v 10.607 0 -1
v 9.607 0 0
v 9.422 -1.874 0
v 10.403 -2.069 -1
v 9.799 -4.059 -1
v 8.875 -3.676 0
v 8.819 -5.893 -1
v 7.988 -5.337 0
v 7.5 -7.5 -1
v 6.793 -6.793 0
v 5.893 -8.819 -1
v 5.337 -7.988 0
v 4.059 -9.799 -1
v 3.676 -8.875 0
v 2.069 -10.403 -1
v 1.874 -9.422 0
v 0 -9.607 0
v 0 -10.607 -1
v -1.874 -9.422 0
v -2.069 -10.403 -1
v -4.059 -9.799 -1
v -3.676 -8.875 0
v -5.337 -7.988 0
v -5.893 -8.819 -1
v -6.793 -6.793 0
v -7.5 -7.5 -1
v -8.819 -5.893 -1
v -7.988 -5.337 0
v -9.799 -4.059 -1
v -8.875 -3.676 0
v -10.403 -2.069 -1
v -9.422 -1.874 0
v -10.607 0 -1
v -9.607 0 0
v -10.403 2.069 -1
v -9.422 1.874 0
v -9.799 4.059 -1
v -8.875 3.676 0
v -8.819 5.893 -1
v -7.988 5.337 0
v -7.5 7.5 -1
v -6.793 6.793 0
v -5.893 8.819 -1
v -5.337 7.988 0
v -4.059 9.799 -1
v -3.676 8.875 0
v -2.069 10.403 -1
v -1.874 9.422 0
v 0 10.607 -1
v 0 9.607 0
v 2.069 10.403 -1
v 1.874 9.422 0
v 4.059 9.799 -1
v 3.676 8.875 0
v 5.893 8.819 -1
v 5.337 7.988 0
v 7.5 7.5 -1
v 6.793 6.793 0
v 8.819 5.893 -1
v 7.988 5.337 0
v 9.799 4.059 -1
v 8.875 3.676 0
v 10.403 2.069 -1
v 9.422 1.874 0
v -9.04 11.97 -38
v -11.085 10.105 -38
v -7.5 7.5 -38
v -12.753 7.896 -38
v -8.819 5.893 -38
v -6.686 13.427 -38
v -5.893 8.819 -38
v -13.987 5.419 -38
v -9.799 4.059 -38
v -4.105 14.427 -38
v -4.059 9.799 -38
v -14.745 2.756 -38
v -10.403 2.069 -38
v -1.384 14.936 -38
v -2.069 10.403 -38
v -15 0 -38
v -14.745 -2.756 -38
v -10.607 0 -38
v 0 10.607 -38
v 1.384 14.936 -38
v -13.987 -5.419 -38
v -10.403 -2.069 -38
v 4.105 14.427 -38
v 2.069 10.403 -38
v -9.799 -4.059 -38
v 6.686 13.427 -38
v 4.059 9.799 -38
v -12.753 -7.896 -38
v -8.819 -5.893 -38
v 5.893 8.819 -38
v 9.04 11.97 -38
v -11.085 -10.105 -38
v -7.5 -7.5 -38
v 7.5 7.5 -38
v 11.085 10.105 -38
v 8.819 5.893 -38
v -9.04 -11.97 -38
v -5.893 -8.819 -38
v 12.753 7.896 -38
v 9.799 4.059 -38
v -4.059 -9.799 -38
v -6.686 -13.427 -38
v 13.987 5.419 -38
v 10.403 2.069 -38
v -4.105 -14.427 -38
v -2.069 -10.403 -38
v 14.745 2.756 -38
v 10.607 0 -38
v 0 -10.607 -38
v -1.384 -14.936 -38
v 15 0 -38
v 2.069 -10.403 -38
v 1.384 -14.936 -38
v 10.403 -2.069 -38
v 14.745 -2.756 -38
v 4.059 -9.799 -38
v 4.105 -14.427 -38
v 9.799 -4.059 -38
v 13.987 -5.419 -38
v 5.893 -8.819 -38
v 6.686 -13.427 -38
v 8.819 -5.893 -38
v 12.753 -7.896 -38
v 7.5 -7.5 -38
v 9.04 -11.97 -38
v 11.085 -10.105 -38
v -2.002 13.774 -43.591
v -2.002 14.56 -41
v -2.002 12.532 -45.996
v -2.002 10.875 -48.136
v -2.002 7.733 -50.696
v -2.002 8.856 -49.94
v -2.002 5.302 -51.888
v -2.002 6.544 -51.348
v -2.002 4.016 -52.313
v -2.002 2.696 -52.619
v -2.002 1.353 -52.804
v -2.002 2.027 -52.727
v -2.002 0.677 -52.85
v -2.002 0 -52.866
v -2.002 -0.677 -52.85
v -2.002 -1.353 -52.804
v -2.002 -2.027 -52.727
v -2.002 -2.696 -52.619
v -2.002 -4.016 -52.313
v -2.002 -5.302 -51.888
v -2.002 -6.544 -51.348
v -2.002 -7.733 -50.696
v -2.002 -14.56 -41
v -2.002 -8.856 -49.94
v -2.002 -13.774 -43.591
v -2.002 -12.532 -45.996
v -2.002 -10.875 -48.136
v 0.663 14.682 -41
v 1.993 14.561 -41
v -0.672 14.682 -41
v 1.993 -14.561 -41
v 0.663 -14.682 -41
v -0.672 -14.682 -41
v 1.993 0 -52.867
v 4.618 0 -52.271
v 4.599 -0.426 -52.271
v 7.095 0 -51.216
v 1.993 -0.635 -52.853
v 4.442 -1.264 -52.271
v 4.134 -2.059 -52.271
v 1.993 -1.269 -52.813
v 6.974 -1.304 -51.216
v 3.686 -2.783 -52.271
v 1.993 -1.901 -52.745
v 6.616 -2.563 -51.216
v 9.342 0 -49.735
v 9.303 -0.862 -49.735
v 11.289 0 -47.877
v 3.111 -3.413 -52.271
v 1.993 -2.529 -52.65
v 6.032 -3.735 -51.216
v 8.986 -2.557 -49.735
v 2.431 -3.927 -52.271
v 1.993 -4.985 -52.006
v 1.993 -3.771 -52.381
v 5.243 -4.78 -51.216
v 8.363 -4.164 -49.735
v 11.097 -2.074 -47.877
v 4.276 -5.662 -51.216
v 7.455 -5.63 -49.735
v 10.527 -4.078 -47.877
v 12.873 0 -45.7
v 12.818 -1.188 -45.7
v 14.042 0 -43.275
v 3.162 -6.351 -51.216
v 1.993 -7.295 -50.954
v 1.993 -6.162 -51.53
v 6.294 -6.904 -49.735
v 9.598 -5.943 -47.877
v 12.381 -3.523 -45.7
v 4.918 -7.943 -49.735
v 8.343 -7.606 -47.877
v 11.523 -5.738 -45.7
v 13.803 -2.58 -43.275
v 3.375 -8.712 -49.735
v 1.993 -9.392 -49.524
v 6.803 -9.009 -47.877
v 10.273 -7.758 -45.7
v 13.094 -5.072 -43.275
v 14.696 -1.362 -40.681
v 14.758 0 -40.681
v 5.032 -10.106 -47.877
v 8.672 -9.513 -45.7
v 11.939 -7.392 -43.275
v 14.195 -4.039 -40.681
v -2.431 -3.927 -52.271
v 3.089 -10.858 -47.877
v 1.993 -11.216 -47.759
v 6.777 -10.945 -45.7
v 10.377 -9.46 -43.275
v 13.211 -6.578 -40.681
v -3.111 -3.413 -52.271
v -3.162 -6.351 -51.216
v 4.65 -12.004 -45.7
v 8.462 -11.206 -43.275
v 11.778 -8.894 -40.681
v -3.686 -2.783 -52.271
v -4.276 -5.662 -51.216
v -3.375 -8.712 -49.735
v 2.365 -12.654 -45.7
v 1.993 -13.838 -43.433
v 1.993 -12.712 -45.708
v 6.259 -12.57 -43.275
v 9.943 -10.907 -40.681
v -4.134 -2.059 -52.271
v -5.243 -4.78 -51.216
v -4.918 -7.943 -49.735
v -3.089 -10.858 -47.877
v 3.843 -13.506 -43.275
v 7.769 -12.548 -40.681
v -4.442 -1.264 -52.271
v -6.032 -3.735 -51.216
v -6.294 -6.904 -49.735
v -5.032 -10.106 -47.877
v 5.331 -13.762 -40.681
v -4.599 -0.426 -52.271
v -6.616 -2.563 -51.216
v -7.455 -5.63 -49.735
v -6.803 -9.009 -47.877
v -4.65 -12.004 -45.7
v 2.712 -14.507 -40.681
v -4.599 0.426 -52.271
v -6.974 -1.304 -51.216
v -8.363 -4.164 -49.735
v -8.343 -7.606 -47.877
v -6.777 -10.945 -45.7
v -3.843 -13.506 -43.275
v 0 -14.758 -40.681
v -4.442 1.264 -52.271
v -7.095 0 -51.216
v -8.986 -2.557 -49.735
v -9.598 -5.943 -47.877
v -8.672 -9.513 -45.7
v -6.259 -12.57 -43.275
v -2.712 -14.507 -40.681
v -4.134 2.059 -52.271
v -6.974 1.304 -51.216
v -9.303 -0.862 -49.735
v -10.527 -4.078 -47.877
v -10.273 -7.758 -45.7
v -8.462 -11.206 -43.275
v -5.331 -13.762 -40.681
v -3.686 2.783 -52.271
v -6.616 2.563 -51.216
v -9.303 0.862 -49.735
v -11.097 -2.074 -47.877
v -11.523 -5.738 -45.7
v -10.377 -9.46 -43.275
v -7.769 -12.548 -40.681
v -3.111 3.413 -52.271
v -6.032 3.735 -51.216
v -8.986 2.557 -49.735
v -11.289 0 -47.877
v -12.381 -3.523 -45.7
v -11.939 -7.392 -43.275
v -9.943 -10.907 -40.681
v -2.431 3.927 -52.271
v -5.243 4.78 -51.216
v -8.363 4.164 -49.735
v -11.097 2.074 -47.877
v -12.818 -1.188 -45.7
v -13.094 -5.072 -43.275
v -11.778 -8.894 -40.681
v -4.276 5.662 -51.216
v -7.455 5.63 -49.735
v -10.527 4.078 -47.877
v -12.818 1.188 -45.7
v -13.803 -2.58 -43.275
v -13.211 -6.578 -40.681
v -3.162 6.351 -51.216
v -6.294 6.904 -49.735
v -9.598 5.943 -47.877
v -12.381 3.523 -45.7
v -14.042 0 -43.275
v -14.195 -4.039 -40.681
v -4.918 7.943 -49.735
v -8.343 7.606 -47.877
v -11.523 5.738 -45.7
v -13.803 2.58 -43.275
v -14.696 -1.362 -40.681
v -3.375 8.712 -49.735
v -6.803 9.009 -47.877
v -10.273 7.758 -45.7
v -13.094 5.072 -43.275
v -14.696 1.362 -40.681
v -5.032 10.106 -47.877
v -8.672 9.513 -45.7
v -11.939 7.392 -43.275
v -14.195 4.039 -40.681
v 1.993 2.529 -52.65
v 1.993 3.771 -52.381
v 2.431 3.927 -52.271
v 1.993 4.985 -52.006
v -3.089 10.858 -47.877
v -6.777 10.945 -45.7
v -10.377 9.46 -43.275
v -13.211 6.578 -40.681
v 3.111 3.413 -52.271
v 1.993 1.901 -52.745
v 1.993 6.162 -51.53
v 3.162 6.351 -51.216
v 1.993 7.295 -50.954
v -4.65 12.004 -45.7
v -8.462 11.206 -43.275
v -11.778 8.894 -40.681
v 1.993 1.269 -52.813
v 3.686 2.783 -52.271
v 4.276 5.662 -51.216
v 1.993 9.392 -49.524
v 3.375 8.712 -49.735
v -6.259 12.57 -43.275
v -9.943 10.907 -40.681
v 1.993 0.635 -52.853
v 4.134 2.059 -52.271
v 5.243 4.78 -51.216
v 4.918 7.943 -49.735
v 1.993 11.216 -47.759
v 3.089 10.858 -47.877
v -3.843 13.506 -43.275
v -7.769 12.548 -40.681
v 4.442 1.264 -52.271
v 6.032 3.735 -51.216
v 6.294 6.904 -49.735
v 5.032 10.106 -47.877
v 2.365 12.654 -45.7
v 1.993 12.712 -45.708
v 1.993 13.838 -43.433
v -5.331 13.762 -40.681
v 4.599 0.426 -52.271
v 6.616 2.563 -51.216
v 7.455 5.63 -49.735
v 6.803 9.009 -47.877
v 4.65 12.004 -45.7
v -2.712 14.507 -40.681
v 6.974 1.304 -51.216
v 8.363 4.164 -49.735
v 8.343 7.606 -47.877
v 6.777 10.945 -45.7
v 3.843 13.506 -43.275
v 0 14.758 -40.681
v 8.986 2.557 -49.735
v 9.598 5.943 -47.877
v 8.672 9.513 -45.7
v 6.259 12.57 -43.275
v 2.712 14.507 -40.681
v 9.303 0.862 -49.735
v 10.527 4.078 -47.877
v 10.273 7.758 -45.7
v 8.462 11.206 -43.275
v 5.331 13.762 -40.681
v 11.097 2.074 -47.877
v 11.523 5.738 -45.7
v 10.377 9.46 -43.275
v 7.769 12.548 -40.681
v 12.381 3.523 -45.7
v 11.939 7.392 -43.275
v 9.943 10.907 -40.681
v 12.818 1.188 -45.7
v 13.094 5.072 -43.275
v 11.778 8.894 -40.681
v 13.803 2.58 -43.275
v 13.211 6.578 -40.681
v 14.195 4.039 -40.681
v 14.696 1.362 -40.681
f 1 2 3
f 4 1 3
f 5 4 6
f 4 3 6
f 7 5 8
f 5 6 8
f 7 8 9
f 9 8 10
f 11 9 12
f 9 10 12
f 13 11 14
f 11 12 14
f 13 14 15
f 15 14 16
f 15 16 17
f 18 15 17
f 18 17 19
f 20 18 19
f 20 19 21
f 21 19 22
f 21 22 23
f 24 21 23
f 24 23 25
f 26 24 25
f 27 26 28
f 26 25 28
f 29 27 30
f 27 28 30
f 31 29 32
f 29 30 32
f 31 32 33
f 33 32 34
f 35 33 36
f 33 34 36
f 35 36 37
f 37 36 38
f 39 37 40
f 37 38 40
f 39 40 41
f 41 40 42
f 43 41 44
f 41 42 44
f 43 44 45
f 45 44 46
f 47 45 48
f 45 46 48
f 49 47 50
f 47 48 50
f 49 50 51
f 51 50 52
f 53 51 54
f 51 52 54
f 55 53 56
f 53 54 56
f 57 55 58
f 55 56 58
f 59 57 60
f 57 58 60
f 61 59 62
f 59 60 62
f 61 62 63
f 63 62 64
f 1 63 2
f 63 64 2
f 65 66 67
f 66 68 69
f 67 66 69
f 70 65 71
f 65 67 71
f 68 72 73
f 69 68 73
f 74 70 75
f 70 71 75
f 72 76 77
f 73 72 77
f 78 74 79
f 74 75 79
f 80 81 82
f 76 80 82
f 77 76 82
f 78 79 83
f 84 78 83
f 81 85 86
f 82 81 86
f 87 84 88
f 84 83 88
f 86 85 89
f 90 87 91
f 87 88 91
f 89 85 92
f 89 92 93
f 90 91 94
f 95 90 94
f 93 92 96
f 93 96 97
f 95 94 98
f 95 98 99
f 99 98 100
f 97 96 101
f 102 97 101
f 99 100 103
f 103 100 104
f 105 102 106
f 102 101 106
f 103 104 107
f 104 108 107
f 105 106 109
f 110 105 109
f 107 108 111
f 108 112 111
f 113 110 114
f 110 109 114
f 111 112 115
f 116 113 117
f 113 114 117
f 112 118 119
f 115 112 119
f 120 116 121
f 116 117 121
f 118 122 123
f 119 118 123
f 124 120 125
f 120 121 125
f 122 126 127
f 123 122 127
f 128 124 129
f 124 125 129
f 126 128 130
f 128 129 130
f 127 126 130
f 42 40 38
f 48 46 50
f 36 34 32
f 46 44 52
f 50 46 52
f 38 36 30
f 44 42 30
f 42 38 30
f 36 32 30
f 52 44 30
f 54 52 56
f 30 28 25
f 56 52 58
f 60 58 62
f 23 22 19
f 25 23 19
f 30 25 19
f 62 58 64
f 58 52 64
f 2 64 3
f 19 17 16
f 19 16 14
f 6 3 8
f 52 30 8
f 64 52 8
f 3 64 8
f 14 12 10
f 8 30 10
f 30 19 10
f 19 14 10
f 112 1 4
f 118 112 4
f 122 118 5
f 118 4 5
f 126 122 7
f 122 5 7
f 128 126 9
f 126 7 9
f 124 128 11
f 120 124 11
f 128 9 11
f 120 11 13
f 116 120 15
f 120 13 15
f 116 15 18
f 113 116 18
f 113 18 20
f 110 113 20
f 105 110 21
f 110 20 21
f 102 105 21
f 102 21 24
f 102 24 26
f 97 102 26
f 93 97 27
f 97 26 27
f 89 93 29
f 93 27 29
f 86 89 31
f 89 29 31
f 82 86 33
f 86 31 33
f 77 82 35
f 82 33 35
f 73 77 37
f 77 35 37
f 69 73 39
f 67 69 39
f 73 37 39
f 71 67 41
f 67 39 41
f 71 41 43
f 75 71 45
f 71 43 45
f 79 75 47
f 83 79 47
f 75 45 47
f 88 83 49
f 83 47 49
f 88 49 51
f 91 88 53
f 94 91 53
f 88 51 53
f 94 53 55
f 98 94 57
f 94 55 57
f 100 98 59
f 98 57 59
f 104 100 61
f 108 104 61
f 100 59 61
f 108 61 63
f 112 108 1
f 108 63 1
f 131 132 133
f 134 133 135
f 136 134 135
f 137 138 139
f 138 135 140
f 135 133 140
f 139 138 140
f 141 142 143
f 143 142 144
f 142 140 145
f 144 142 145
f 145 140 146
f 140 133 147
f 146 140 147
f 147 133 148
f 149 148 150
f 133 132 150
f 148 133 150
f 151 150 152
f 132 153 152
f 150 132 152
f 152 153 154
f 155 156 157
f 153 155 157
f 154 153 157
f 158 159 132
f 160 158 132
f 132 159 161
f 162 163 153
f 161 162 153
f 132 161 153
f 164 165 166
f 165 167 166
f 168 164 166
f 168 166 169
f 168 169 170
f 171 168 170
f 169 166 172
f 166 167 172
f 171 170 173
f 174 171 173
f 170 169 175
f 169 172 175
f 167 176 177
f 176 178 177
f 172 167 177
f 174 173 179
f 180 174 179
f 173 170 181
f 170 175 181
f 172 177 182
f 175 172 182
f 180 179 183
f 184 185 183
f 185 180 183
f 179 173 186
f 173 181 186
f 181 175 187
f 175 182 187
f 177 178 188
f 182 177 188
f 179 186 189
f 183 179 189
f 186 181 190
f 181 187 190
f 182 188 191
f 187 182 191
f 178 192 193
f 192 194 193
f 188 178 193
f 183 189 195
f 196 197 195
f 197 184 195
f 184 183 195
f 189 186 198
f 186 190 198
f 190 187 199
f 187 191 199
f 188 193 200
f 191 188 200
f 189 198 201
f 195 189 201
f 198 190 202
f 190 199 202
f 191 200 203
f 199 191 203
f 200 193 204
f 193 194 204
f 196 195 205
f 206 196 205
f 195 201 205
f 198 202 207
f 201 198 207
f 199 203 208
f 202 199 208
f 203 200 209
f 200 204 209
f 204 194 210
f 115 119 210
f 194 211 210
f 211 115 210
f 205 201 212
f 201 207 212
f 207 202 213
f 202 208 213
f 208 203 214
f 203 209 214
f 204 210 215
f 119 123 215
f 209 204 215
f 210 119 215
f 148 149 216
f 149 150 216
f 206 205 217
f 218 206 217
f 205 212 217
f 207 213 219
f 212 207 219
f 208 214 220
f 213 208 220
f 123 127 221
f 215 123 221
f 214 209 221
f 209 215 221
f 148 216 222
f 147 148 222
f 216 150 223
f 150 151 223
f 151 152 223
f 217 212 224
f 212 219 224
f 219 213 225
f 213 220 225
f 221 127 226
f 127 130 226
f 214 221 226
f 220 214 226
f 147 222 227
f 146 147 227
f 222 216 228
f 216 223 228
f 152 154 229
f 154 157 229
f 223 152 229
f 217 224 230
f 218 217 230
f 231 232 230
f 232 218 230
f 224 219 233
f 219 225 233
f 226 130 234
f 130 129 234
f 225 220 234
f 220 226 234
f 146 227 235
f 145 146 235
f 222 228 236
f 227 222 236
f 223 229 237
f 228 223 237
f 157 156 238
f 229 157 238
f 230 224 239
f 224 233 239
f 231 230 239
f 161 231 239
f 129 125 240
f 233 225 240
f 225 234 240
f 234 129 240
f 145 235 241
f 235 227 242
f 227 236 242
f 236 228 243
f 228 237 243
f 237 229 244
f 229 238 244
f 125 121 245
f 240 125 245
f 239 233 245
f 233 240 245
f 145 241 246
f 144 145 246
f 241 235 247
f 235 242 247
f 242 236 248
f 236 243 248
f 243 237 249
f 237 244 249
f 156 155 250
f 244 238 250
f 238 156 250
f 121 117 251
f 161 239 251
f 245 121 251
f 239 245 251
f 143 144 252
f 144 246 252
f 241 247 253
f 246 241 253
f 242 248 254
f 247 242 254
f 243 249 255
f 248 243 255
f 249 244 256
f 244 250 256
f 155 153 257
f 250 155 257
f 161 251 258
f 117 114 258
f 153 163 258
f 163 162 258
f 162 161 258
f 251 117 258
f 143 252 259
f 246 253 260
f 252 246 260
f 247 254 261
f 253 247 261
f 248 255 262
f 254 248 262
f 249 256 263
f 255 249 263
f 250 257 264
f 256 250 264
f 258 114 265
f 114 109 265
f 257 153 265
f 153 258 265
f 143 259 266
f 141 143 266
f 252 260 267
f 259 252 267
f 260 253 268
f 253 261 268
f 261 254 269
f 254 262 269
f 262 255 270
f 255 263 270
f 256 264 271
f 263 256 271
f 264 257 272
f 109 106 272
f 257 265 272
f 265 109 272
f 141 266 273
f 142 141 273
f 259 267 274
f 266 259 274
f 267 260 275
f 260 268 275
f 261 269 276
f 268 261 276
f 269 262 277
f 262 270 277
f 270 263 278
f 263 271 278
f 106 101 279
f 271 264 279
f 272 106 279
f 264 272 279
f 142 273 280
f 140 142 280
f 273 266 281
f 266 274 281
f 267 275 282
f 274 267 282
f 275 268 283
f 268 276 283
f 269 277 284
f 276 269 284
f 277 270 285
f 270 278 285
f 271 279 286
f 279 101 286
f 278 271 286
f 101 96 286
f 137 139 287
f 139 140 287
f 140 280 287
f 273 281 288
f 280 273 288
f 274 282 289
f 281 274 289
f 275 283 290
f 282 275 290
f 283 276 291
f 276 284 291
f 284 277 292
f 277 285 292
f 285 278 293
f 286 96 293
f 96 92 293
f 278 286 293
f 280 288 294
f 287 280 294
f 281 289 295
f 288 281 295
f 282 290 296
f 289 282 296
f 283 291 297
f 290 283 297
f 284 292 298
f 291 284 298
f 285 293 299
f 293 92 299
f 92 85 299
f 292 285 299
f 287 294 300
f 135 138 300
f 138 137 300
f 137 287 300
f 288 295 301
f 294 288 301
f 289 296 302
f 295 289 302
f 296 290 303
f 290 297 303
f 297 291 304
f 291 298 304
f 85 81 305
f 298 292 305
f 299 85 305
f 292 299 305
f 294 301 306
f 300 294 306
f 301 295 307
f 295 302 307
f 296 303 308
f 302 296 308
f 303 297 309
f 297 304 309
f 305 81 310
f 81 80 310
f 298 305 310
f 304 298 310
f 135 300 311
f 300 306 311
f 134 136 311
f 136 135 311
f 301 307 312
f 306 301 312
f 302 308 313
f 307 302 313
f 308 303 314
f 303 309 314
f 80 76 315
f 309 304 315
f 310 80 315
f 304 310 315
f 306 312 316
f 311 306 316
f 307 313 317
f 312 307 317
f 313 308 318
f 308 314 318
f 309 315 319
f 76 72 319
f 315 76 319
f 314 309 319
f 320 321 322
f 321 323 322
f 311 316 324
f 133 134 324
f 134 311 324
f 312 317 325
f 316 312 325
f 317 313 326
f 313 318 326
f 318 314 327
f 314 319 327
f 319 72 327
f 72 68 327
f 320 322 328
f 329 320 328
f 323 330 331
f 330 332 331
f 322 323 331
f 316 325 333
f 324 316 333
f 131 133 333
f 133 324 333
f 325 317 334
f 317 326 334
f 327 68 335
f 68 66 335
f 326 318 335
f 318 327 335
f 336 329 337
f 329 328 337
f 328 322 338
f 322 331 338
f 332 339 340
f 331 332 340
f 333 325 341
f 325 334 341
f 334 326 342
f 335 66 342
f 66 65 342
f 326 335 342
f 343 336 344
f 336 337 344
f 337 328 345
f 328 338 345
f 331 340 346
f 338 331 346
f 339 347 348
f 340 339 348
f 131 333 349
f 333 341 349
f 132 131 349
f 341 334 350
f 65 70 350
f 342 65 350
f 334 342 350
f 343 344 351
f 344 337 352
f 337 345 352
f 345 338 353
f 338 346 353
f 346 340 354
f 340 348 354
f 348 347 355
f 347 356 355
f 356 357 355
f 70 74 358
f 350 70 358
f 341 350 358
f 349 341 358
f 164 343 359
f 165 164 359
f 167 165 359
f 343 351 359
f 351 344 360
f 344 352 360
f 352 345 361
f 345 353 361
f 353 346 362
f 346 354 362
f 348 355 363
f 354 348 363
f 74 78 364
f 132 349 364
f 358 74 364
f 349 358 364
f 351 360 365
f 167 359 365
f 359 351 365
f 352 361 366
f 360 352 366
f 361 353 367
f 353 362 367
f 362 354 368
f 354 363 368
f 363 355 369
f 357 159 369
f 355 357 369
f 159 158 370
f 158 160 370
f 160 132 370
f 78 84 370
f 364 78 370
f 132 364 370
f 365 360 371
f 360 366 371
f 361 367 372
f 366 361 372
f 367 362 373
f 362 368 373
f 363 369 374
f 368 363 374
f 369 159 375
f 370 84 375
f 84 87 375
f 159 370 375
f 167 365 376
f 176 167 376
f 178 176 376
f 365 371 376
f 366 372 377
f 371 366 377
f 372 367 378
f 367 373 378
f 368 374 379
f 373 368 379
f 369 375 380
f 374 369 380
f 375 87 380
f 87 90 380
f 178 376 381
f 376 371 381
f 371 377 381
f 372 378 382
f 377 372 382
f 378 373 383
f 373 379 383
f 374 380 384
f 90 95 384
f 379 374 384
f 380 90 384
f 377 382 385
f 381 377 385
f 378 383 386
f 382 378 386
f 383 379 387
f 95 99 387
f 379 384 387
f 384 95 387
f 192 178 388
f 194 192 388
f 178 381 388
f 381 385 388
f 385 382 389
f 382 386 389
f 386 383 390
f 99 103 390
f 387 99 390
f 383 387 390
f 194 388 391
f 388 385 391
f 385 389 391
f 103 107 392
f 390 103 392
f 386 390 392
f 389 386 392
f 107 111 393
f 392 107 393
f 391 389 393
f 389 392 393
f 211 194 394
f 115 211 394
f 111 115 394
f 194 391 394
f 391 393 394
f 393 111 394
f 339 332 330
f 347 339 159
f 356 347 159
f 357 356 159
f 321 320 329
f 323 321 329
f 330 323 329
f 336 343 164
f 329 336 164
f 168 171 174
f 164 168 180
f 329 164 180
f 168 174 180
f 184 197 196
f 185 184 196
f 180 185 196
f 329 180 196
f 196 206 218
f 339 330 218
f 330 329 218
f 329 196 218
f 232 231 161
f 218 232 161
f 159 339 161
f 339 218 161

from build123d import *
from OCP.BRepAlgoAPI import BRepAlgoAPI_Cut
from OCP.TopTools import TopTools_ListOfShape

# Parameters (mm, degrees)
CUT_EXTRUDE2_DEPTH      = 17.000000000000007
CUT_EXTRUDE2_DEPTH_BACK = 17.000000000000004
SKETCH4_R               = 1.9934980389772232
CUT_EXTRUDE3_DEPTH      = 5.000000000000005
CHAMFER1_SIZE           = 1


with BuildPart() as part:
    # Sketch1 → Revolve1 (revolve)
    with BuildSketch(Plane(origin=(0, 0, 0), x_dir=(1, 0, 0), z_dir=(0, 1, 0))):
        with BuildLine():
            Line((0, 0), (0, 38))
            Line((0, 38), (0, 53))
            ThreePointArc((0, 53), (10.60660171779814, 48.60660171779814), (15, 38))
            Line((15, 38), (10.60660171779814, 38))
            Line((10.60660171779814, 38), (10.606601717798139, -3.47e-15))
            Line((10.606601717798139, -3.47e-15), (0, 0))
        make_face()
    revolve(axis=Axis((0, 0, 0), (0, 0, -1)))


with BuildPart() as cut_extrude2_tool:
    # Sketch3 → Cut-Extrude2 (new, two sides: drawn at the far end of the back side and taken through both)
    with BuildSketch(Plane(origin=(0, 0, 0), x_dir=(1, 0, 0), z_dir=(0, 1, 0)).offset(-CUT_EXTRUDE2_DEPTH_BACK)):
        Polygon((-2.0023692524081933, 52.866942038246904), (1.9934980389762682, 52.866942038246904), (1.9934980389762682, 41), (-2.0023692524081937, 41), align=None)
    extrude(amount=CUT_EXTRUDE2_DEPTH + CUT_EXTRUDE2_DEPTH_BACK)


with BuildPart() as part_1:
    add(part.part)

    # Cut-Extrude2: cut by cut_extrude2_tool, with a tolerance
    cut_extrude2_stock = TopTools_ListOfShape()
    cut_extrude2_stock.Append(part_1.part.wrapped)
    cut_extrude2_tools = TopTools_ListOfShape()
    cut_extrude2_tools.Append(cut_extrude2_tool.part.wrapped)
    cut_extrude2_cut = BRepAlgoAPI_Cut()
    cut_extrude2_cut.SetArguments(cut_extrude2_stock)
    cut_extrude2_cut.SetTools(cut_extrude2_tools)
    cut_extrude2_cut.SetFuzzyValue(0.00001)
    cut_extrude2_cut.Build()
    add(Compound.cast(cut_extrude2_cut.Shape()).solids(), mode=Mode.REPLACE)


with BuildPart() as cut_extrude2_piece_1:
    # of the separate pieces the step leaves, piece 1, a body of its own (cut_extrude2_pieces)
    add(part_1.part.solids().sort_by_distance((1.993498039, 14.561111413, -41))[0])

    # Chamfer1
    chamfer1_edges = [cut_extrude2_piece_1.edges().sort_by_distance(p)[0] for p in [
        (-10.606601717798139, -1.3e-15, 3.47e-15),
    ]]
    chamfer(chamfer1_edges, length=CHAMFER1_SIZE)


with BuildPart() as cut_extrude2_piece_2:
    # of the separate pieces the step leaves, piece 2, a body of its own (cut_extrude2_pieces)
    add(part_1.part.solids().sort_by_distance((0, 0, -53))[0])

    # Sketch4 → Cut-Extrude3 (cut)
    with BuildSketch(Plane.XY.offset(-52.866942038246904)):
        Circle(SKETCH4_R)
    extrude(amount=-CUT_EXTRUDE3_DEPTH, mode=Mode.SUBTRACT)


solid = cut_extrude2_piece_1.part
